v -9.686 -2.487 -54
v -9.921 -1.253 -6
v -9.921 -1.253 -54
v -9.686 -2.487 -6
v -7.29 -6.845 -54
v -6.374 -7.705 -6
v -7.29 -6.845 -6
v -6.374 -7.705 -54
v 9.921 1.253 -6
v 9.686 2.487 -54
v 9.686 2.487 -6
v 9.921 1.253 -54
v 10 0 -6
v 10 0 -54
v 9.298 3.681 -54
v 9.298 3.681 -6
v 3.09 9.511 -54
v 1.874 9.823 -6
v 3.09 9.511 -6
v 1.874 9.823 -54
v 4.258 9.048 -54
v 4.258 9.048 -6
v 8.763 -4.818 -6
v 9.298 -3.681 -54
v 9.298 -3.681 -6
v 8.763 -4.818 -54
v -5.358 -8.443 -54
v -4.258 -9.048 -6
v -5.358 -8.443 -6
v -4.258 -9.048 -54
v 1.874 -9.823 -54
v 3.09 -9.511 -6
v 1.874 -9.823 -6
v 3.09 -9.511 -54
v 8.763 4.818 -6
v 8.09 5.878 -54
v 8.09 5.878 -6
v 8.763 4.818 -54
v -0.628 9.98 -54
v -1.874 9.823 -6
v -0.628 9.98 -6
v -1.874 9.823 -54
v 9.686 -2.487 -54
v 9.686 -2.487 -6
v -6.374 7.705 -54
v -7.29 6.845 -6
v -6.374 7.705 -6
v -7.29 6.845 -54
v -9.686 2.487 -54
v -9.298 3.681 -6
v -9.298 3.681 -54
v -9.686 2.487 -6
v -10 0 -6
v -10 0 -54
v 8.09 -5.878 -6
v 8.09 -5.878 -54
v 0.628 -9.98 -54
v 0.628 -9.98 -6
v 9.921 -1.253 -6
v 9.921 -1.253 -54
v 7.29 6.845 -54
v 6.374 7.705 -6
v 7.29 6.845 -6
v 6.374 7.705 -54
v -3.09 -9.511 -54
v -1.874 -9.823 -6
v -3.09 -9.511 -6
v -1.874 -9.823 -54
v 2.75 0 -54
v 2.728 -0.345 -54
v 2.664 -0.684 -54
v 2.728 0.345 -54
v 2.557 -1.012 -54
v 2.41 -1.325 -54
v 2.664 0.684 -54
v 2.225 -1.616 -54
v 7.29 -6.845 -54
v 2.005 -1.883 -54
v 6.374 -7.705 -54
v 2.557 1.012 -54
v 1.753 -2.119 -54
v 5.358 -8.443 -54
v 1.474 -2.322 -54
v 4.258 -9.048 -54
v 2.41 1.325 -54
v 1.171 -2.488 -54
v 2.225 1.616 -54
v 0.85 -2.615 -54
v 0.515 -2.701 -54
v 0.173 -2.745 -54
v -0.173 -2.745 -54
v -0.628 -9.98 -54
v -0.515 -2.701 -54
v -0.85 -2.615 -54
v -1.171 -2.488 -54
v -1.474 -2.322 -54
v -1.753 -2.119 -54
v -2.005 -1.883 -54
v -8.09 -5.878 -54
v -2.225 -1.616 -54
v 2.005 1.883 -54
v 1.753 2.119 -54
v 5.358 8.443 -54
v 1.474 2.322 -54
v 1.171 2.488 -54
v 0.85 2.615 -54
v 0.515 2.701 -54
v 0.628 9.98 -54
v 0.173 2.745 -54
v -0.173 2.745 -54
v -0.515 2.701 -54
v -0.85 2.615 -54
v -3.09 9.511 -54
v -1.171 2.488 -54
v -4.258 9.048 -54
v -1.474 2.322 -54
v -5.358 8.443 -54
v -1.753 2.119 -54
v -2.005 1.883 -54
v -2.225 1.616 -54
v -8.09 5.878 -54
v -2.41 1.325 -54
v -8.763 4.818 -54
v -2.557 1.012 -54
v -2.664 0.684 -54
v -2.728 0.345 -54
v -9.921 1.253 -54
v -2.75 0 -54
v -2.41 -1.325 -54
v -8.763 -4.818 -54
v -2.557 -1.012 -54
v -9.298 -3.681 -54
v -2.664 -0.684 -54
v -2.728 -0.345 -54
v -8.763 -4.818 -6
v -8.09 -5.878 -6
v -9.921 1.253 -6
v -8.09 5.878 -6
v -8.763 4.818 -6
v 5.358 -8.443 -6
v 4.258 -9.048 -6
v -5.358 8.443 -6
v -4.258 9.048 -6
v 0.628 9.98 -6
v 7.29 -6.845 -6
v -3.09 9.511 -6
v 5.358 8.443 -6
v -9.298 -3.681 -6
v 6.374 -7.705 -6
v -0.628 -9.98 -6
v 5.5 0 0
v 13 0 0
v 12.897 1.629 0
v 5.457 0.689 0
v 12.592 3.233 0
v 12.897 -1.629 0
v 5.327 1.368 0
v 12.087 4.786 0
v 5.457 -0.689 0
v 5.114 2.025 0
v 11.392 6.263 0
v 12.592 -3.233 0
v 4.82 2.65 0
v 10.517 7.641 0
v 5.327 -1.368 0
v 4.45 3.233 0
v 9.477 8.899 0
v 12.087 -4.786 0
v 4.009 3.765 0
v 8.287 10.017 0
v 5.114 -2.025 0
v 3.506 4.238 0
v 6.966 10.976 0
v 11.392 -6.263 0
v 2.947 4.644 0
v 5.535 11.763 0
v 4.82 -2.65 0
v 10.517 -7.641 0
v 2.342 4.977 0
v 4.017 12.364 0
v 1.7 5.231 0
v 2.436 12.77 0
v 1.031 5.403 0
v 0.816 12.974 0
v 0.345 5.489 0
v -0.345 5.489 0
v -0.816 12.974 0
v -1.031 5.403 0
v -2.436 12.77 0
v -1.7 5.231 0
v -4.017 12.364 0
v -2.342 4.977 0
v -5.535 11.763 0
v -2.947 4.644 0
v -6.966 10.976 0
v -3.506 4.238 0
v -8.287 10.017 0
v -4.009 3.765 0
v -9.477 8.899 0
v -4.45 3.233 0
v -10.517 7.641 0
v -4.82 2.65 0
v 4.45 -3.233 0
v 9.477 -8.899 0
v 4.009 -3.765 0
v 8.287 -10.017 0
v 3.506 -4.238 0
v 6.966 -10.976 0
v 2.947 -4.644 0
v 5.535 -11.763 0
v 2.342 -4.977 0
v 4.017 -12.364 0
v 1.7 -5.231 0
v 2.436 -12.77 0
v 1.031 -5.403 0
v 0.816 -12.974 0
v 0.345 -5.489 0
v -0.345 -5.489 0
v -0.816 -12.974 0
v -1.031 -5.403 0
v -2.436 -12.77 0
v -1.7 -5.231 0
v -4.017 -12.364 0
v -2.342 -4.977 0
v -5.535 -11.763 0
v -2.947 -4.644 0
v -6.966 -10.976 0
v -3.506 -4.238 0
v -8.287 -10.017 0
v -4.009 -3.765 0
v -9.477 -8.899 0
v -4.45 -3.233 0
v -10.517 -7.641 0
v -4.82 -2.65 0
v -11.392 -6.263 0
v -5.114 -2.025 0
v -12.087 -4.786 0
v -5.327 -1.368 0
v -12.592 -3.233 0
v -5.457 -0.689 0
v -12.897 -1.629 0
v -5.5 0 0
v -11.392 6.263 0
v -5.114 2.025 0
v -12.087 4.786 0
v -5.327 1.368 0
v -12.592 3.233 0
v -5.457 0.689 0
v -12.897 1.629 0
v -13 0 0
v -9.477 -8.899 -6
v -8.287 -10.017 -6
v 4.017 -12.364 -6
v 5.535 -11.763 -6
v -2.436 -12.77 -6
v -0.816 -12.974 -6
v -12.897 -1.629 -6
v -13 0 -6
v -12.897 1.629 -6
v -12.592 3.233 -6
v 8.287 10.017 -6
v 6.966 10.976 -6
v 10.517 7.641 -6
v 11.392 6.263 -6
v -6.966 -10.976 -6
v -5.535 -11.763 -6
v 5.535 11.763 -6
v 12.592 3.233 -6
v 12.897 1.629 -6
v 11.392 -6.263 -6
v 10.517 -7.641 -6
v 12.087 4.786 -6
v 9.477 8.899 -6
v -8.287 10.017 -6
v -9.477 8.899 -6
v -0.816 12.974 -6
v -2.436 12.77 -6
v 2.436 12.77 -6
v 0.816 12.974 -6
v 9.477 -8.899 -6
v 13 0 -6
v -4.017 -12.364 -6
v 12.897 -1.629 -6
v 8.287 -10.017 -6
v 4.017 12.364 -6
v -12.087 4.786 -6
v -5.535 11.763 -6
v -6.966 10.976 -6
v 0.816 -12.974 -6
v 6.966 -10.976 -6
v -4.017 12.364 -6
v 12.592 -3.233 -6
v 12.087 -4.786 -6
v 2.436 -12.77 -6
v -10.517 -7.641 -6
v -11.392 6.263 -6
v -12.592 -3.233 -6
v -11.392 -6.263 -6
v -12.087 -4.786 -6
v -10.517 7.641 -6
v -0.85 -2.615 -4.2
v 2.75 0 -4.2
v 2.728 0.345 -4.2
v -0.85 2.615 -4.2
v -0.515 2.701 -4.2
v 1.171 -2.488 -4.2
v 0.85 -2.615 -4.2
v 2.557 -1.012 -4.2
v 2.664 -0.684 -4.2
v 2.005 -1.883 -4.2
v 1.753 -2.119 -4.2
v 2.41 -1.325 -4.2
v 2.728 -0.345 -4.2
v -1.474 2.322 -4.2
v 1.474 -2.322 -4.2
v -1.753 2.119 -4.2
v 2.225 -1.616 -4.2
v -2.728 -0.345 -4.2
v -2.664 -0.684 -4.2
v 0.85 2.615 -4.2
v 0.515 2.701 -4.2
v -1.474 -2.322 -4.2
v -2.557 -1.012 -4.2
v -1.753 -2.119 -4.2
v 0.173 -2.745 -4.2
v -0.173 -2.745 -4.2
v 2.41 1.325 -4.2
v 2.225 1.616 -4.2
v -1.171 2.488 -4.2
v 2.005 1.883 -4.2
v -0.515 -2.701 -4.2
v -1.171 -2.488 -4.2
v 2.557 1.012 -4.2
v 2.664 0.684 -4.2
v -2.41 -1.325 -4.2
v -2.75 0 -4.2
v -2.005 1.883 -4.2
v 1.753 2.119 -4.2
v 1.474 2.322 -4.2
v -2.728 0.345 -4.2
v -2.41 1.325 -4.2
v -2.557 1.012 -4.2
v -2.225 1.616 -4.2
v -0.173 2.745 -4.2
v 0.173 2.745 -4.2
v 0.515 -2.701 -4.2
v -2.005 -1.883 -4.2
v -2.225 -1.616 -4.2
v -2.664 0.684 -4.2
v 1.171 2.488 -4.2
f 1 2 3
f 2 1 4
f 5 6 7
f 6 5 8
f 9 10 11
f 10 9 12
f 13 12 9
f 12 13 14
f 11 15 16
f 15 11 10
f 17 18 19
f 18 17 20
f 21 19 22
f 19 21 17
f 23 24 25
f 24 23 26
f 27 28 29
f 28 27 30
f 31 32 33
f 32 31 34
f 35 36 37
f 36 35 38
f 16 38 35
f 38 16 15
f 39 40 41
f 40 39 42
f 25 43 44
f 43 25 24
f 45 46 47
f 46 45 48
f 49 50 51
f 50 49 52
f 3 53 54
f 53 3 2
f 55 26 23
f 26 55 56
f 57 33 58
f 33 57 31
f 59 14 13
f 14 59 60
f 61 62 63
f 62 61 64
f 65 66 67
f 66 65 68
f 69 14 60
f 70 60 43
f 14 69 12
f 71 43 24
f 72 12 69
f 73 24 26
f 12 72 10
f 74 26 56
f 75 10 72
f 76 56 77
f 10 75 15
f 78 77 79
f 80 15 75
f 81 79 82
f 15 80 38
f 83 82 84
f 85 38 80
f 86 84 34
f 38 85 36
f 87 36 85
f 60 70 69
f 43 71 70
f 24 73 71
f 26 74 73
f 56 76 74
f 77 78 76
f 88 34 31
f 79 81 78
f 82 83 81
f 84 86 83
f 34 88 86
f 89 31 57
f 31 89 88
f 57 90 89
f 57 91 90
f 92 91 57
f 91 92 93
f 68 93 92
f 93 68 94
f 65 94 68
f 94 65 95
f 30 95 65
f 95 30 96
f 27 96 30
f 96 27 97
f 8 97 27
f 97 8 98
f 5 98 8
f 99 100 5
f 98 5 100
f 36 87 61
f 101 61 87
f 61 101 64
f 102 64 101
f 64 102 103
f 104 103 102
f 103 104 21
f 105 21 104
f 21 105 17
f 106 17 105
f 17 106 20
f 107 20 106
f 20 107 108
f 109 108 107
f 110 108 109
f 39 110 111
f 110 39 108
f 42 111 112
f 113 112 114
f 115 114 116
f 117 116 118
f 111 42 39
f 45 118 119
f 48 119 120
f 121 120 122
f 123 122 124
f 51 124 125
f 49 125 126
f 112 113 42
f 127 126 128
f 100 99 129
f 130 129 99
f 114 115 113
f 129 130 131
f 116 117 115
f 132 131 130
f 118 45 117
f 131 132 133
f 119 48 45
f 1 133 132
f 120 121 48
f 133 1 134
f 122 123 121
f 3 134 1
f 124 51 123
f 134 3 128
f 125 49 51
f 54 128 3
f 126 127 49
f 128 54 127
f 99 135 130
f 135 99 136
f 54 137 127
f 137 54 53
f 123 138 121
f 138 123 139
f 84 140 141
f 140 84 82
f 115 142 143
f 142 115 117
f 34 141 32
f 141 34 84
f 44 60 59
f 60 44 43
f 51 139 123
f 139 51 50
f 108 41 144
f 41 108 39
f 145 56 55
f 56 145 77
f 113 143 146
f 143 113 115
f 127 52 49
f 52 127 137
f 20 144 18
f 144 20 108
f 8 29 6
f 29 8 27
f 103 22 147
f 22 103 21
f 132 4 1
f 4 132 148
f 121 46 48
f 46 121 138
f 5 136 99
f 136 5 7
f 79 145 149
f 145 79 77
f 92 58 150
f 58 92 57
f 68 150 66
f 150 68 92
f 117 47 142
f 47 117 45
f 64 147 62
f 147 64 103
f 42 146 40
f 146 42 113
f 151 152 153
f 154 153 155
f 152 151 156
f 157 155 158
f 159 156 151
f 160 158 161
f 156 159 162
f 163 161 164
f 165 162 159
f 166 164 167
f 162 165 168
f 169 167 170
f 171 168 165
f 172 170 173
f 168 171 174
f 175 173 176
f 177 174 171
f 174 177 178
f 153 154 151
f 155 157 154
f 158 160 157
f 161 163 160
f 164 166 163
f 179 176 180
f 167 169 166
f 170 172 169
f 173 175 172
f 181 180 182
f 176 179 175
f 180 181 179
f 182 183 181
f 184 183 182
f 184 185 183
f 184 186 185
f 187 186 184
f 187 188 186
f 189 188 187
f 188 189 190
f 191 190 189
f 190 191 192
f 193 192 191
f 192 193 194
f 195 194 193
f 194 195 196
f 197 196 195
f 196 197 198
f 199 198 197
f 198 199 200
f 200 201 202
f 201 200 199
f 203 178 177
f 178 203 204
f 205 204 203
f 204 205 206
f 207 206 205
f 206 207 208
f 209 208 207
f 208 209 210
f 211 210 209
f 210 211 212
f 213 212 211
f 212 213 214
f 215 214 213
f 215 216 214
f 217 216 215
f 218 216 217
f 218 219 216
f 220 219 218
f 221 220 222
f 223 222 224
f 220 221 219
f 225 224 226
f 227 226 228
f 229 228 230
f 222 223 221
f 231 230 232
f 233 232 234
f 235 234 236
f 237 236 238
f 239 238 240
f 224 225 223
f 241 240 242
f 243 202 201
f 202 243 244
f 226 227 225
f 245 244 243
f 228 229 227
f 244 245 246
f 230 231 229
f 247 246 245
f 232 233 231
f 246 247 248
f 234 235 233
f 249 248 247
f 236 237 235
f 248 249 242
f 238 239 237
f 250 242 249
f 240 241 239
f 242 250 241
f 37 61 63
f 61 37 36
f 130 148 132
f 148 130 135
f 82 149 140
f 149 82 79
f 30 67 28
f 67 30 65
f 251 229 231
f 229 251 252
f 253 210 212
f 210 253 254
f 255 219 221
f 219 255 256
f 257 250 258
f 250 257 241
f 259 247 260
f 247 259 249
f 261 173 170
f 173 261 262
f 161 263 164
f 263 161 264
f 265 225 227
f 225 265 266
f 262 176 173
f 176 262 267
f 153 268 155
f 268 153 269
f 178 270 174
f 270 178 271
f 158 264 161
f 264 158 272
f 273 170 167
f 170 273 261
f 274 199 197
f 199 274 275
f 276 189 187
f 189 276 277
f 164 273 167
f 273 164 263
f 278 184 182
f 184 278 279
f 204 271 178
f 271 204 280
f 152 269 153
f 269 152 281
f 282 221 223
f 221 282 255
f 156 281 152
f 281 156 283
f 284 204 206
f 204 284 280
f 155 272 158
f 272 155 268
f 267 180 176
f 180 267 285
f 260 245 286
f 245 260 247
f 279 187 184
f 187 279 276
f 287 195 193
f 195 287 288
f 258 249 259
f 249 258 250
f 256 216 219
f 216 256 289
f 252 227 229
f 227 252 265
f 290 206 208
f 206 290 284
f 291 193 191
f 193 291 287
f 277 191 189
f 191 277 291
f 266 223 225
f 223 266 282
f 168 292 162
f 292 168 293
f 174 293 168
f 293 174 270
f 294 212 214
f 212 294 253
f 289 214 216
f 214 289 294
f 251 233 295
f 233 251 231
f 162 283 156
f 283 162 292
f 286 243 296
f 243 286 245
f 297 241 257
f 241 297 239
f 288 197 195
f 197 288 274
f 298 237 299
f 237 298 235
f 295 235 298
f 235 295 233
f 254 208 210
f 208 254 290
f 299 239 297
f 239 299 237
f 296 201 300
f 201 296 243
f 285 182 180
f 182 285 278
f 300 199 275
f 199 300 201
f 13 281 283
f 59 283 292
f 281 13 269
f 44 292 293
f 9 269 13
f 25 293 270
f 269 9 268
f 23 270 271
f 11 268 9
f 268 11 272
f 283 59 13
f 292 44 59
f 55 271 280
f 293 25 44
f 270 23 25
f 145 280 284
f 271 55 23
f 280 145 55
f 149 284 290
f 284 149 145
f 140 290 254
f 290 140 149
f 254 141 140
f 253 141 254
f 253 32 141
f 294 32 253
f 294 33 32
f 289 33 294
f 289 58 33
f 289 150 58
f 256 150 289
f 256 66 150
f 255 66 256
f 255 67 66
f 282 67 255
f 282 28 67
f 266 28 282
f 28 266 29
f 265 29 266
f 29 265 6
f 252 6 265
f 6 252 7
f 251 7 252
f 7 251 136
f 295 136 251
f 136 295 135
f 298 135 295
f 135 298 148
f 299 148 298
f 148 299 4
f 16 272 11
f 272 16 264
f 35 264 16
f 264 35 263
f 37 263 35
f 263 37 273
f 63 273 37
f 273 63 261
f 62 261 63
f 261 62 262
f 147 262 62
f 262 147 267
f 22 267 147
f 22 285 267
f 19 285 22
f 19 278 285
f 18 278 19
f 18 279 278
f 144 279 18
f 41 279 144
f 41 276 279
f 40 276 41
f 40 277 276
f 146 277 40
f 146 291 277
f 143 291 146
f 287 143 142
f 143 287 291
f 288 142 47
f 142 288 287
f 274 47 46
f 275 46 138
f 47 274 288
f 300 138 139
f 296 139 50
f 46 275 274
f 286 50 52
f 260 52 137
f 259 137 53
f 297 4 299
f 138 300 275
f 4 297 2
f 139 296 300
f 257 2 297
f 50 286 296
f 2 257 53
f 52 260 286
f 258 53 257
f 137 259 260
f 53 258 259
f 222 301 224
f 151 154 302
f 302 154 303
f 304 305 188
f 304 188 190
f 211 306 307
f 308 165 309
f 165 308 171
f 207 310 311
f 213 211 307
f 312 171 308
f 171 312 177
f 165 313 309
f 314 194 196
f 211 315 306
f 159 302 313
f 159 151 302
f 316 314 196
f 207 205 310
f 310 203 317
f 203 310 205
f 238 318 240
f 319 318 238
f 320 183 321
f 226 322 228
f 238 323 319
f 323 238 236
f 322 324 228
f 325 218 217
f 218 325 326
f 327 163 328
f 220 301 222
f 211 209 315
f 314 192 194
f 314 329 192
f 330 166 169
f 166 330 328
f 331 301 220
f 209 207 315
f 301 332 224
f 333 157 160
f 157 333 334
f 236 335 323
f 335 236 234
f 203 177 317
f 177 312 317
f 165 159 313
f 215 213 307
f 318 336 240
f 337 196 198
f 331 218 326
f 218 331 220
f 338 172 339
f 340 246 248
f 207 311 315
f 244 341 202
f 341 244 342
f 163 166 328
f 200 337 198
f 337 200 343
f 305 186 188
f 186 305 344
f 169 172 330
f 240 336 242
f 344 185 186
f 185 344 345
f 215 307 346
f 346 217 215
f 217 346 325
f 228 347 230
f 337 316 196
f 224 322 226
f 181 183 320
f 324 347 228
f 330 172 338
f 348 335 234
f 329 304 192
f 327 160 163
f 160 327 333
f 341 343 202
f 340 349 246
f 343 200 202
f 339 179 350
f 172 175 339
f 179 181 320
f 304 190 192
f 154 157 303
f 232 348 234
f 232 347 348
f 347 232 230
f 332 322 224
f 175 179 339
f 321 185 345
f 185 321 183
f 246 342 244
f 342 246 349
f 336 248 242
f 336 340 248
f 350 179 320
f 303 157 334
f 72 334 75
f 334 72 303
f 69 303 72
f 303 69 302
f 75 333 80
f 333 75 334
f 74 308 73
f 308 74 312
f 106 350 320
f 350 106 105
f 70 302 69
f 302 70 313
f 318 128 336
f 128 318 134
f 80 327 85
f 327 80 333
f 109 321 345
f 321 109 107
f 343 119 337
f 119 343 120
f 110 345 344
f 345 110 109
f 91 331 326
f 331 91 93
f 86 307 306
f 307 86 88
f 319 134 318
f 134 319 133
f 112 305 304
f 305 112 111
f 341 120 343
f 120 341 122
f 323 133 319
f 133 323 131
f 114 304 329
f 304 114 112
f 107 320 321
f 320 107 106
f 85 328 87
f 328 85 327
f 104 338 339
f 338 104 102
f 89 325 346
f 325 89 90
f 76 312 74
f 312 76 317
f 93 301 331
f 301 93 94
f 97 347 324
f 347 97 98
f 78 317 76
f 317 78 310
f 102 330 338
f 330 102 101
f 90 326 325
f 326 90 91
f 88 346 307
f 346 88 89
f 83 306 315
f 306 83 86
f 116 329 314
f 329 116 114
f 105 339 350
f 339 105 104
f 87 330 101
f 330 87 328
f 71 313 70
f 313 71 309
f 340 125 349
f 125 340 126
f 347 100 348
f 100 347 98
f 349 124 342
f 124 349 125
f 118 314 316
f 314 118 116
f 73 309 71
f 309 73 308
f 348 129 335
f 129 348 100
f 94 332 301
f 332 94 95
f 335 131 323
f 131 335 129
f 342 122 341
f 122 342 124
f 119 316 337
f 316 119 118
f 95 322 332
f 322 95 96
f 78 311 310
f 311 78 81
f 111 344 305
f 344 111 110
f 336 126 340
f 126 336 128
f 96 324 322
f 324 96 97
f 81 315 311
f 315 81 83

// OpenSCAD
$fn = 50;


difference() {
	union() {
		translate(v = [0, 0, -54.0000000000]) {
			cylinder(h = 54, r = 10.0000000000);
		}
		translate(v = [0, 0, -6.0000000000]) {
			cylinder(h = 6, r = 13.0000000000);
		}
	}
	union() {
		translate(v = [0, 0, 0]) {
			rotate(a = [0, 0, 0]) {
				difference() {
					union() {
						#translate(v = [0, 0, -54.0000000000]) {
							cylinder(h = 54, r = 2.2500000000);
						}
						#translate(v = [0, 0, -4.2000000000]) {
							cylinder(h = 4.2000000000, r = 10.0000000000, r1 = 2.7500000000, r2 = 5.5000000000);
						}
						#translate(v = [0, 0, -54.0000000000]) {
							cylinder(h = 54, r = 2.7500000000);
						}
						#translate(v = [0, 0, -54.0000000000]) {
							cylinder(h = 54, r = 2.2500000000);
						}
					}
					union();
				}
			}
		}
	}
}
